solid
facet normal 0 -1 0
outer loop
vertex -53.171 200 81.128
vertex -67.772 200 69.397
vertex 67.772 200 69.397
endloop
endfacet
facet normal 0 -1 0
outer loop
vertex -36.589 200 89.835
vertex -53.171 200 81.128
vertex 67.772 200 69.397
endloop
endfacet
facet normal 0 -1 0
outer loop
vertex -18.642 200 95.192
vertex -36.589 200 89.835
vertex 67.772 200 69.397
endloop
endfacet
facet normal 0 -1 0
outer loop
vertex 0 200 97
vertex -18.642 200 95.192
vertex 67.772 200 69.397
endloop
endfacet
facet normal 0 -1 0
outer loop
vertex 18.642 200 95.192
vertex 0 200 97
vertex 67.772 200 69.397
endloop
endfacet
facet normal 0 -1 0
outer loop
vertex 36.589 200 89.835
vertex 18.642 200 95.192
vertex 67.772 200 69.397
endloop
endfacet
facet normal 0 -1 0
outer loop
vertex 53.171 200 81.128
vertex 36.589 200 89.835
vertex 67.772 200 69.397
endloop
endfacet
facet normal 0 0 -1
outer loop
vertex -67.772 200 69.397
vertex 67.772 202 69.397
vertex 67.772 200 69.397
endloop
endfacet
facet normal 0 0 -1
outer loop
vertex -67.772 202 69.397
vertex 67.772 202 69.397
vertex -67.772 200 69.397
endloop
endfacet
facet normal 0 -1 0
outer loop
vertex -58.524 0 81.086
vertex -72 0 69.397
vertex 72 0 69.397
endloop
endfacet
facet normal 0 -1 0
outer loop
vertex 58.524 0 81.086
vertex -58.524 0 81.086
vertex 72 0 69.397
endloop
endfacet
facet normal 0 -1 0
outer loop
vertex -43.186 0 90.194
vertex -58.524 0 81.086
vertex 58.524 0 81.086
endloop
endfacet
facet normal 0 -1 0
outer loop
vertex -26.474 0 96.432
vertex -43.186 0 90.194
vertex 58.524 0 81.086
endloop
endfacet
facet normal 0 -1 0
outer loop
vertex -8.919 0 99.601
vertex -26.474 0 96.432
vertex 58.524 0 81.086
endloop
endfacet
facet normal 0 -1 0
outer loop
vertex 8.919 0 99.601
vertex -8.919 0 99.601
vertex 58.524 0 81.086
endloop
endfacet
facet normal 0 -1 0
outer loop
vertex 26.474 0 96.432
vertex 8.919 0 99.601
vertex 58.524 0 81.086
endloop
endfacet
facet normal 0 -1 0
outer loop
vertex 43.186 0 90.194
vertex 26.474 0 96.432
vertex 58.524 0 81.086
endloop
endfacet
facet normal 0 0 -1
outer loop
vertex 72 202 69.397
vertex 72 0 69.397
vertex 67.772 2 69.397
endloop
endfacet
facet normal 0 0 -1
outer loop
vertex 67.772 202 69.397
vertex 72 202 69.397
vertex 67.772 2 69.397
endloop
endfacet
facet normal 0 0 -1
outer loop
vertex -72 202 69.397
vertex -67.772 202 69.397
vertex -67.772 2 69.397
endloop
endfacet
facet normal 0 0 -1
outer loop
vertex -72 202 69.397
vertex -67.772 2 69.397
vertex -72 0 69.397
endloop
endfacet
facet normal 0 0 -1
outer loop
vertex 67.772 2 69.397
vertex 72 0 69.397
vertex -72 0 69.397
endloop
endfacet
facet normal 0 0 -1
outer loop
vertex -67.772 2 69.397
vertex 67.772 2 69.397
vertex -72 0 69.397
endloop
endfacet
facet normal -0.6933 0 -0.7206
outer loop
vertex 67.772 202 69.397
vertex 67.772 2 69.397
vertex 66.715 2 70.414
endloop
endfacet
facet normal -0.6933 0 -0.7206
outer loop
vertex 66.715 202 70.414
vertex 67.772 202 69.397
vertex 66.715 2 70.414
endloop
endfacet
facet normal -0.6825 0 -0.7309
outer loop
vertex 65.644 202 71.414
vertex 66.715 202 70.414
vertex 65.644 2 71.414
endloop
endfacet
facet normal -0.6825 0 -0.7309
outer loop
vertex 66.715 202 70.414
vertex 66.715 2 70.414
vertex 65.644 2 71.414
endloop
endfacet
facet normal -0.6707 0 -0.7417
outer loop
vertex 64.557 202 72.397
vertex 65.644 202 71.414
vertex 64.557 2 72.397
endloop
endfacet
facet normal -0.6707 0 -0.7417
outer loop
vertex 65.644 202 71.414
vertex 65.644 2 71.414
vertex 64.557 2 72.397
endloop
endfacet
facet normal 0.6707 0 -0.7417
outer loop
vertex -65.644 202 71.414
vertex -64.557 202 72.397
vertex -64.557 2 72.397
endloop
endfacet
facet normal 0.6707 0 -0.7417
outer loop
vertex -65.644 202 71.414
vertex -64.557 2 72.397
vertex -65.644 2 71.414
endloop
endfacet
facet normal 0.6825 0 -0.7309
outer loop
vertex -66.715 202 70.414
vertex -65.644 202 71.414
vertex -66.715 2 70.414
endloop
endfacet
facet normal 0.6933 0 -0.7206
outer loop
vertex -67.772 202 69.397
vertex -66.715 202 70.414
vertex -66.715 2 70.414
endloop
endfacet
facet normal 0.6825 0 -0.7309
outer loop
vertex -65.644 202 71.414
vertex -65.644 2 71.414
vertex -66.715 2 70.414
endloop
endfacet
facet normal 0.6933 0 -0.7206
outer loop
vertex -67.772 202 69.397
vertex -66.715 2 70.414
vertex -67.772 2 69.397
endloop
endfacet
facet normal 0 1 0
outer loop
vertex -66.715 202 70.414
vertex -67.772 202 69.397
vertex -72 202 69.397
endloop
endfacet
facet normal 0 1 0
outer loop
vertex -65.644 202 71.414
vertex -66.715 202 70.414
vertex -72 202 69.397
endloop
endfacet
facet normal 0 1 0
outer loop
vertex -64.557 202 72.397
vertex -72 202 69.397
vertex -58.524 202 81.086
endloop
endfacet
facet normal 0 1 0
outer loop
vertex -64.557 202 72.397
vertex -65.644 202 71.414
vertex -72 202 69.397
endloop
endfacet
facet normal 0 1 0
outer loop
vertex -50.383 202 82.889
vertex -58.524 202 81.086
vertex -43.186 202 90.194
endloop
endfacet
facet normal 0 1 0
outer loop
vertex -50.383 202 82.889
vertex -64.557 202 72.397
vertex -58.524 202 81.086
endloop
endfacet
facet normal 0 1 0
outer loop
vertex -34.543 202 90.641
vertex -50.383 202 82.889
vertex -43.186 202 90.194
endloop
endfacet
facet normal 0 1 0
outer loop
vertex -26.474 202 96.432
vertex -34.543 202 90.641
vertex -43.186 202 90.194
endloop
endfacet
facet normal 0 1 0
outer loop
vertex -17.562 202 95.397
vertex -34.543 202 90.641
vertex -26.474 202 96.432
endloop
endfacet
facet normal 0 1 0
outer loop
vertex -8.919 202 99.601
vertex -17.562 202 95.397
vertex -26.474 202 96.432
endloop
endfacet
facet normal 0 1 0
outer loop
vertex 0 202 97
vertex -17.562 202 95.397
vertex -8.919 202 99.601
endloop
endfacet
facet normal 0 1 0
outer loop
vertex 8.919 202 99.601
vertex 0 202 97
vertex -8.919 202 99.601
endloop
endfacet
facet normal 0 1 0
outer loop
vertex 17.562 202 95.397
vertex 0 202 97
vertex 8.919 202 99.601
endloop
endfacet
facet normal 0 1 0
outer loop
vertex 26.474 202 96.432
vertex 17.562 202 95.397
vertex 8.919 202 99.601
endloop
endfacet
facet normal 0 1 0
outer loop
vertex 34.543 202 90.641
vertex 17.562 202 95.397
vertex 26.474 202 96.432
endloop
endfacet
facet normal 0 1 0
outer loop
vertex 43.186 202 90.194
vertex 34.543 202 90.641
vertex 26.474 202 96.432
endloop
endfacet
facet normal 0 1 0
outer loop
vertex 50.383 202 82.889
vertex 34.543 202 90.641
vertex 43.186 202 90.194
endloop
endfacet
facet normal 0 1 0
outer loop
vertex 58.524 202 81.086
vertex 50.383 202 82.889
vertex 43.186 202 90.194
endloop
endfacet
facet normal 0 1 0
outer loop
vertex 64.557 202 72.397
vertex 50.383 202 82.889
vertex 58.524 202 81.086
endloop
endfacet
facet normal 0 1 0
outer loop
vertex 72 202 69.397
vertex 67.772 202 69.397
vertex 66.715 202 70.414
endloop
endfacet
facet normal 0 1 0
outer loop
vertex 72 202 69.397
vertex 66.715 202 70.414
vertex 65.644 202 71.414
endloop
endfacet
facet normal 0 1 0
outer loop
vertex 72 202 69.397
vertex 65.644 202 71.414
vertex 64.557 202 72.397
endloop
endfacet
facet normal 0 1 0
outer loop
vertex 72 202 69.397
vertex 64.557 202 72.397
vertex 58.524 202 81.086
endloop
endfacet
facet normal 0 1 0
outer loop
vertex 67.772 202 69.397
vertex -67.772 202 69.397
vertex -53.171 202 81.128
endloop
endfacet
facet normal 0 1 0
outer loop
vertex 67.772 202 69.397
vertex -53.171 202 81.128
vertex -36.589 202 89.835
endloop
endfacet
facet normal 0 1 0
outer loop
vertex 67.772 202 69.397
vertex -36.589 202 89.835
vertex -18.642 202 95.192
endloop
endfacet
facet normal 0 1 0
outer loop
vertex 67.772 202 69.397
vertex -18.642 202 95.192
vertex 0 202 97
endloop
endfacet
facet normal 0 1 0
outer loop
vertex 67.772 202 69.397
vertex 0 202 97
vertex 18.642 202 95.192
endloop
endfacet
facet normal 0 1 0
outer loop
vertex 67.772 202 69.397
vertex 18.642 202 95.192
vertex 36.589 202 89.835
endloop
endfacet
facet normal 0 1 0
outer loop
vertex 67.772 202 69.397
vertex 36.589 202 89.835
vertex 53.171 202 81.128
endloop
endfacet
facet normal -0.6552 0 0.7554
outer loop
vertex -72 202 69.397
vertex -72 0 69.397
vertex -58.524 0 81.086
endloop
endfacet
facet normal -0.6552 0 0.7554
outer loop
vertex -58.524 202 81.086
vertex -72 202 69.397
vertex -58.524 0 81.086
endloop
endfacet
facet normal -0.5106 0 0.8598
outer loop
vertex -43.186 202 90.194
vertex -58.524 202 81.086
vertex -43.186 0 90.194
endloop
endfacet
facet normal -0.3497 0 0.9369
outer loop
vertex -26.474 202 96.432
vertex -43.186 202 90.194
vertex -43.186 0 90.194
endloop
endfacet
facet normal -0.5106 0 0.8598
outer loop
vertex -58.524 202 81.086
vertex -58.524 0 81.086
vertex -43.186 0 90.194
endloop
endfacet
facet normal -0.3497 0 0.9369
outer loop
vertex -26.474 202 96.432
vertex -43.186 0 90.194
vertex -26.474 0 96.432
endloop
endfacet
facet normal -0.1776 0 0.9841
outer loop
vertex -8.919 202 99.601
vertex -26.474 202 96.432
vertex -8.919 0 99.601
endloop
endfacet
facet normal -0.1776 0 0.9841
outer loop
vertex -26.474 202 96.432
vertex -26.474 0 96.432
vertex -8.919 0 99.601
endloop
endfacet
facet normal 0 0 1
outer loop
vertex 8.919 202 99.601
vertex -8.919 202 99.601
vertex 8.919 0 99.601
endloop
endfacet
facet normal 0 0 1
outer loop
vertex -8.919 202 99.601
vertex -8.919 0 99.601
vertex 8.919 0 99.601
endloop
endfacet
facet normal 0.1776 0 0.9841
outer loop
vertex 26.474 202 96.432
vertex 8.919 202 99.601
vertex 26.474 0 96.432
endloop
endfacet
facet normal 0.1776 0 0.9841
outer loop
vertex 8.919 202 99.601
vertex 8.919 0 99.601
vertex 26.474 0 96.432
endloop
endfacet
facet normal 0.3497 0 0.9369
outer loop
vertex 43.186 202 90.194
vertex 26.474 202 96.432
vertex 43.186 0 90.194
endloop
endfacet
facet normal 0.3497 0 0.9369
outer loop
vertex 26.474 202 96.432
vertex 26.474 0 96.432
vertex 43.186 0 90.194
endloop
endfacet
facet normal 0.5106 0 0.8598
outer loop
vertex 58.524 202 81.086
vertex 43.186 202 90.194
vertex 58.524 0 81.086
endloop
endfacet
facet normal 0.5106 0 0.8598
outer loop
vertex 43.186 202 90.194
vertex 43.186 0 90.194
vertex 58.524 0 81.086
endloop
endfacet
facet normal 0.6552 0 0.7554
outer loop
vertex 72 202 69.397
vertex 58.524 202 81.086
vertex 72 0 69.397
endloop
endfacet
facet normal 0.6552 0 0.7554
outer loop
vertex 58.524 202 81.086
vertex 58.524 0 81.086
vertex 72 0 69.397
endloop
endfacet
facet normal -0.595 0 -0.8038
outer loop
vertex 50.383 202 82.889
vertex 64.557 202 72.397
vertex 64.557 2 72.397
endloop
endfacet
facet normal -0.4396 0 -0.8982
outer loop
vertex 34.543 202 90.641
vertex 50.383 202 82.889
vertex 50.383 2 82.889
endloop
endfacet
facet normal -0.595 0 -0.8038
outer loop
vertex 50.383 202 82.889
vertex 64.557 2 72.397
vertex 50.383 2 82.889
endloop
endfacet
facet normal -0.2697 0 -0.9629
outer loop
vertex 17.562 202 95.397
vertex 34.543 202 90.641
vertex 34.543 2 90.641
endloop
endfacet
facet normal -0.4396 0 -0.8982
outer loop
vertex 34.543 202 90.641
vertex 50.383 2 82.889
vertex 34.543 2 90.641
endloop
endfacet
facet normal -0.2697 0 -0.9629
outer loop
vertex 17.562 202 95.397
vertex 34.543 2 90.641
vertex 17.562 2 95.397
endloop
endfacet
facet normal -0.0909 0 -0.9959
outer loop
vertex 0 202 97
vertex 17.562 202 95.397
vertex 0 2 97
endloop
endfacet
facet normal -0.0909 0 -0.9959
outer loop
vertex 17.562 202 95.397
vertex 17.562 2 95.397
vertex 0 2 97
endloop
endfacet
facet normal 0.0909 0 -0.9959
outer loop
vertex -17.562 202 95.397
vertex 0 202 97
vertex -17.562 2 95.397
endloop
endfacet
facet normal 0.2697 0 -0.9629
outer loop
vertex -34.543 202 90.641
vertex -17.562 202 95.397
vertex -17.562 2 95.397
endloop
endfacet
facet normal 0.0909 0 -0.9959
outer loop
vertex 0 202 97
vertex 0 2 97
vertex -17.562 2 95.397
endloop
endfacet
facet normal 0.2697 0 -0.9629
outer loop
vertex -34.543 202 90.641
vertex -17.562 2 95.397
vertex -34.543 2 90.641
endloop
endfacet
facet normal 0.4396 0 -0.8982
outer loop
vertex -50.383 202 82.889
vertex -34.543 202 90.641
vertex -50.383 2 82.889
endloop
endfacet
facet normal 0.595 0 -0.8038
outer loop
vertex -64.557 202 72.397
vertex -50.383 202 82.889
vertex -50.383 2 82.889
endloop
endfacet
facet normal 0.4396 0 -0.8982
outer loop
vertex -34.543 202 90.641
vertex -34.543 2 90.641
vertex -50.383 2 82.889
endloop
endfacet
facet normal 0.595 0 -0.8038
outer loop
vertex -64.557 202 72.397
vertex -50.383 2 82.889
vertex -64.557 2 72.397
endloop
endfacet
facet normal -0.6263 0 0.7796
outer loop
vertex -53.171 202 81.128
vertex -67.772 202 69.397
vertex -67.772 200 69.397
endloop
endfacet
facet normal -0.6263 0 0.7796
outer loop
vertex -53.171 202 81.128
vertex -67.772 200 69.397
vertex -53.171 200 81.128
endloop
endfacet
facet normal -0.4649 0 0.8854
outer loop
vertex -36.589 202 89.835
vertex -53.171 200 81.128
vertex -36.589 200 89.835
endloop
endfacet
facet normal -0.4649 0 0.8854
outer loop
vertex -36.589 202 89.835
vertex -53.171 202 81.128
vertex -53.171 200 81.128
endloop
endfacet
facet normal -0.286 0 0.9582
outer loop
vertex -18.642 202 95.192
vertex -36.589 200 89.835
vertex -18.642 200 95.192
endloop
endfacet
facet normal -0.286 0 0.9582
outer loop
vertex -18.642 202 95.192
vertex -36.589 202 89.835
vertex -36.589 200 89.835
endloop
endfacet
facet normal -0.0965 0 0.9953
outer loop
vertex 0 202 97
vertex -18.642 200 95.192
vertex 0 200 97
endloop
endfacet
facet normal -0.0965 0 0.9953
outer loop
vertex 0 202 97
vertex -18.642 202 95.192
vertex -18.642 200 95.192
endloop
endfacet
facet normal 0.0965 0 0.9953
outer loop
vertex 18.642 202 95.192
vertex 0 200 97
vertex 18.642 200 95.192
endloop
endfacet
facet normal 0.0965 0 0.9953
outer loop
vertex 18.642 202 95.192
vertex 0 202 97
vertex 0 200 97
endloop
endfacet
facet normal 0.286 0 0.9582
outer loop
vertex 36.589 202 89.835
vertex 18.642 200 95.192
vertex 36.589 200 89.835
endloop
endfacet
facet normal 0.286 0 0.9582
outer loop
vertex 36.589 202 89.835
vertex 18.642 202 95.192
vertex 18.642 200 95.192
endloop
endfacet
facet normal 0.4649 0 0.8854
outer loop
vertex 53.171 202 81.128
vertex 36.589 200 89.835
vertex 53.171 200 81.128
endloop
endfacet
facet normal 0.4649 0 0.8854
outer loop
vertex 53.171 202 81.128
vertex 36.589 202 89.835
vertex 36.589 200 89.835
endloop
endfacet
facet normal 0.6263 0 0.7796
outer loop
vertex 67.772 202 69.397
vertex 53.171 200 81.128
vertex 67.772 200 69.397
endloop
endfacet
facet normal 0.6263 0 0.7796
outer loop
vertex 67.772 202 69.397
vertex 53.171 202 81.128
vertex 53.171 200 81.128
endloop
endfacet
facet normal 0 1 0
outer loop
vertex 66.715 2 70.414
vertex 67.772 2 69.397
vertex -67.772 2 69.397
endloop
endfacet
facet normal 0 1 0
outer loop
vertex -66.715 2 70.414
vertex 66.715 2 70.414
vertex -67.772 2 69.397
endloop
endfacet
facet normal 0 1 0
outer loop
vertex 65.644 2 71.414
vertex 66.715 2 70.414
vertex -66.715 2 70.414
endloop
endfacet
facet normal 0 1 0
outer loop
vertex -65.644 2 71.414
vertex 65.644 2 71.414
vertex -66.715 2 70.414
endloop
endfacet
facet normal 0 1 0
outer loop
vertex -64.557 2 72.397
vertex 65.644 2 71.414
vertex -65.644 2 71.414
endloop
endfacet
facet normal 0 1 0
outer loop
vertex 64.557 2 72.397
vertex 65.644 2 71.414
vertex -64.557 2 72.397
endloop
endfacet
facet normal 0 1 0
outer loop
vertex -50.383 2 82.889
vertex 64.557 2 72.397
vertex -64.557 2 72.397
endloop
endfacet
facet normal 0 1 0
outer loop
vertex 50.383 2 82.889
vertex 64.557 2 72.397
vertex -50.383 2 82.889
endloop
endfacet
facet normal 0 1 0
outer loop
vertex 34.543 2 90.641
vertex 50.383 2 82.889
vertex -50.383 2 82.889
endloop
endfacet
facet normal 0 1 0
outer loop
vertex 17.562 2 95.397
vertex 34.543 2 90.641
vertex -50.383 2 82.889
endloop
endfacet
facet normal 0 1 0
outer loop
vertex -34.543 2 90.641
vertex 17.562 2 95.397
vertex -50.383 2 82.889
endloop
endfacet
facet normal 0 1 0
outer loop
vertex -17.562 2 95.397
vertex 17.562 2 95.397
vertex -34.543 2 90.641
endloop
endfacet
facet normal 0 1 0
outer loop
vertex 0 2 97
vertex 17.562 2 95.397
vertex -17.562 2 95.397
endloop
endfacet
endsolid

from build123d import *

# Parameters (mm, degrees)
BOSS_EXTRUDE3_DEPTH = 202
BOSS_EXTRUDE4_DEPTH = 2
BOSS_EXTRUDE5_DEPTH = 2


with BuildPart() as part:
    # Sketch1 → Boss-Extrude3 (new body)
    with BuildSketch(Plane(origin=(0, 0, 0), x_dir=(1, 0, 0), z_dir=(0, 1, 0))):
        with BuildLine():
            Line((-67.771675499, -69.397406292), (-72, -69.397406292))
            ThreePointArc((-72, -69.397406292), (0, -100), (72, -69.397406292))
            Line((72, -69.397406292), (67.771675499, -69.397406292))
            ThreePointArc((67.771675499, -69.397406292), (66.18137474, -70.915623367), (64.557072132, -72.397406292))
            ThreePointArc((64.557072132, -72.397406292), (0, -97), (-64.557072132, -72.397406292))
            ThreePointArc((-64.557072132, -72.397406292), (-66.18137474, -70.915623367), (-67.771675499, -69.397406292))
        make_face()
    extrude(amount=BOSS_EXTRUDE3_DEPTH)

    # Sketch1<6> → Boss-Extrude4 (add)
    with BuildSketch(Plane(origin=(0, 0, 0), x_dir=(1, 0, 0), z_dir=(0, 1, 0))):
        with BuildLine():
            Line((-72, -69.397406292), (72, -69.397406292))
            ThreePointArc((72, -69.397406292), (0, -100), (-72, -69.397406292))
        make_face()
    extrude(amount=BOSS_EXTRUDE4_DEPTH)


with BuildPart() as body_2:
    # Sketch7 → Boss-Extrude5 (new body)
    with BuildSketch(Plane(origin=(0, 202, 0), x_dir=(1, 0, 0), z_dir=(0, 1, 0))):
        with BuildLine():
            Line((67.771675499, -69.397406292), (-67.771675499, -69.397406292))
            ThreePointArc((-67.771675499, -69.397406292), (0, -97), (67.771675499, -69.397406292))
        make_face()
    extrude(amount=-BOSS_EXTRUDE5_DEPTH)


solid = Compound([part.part, body_2.part])
